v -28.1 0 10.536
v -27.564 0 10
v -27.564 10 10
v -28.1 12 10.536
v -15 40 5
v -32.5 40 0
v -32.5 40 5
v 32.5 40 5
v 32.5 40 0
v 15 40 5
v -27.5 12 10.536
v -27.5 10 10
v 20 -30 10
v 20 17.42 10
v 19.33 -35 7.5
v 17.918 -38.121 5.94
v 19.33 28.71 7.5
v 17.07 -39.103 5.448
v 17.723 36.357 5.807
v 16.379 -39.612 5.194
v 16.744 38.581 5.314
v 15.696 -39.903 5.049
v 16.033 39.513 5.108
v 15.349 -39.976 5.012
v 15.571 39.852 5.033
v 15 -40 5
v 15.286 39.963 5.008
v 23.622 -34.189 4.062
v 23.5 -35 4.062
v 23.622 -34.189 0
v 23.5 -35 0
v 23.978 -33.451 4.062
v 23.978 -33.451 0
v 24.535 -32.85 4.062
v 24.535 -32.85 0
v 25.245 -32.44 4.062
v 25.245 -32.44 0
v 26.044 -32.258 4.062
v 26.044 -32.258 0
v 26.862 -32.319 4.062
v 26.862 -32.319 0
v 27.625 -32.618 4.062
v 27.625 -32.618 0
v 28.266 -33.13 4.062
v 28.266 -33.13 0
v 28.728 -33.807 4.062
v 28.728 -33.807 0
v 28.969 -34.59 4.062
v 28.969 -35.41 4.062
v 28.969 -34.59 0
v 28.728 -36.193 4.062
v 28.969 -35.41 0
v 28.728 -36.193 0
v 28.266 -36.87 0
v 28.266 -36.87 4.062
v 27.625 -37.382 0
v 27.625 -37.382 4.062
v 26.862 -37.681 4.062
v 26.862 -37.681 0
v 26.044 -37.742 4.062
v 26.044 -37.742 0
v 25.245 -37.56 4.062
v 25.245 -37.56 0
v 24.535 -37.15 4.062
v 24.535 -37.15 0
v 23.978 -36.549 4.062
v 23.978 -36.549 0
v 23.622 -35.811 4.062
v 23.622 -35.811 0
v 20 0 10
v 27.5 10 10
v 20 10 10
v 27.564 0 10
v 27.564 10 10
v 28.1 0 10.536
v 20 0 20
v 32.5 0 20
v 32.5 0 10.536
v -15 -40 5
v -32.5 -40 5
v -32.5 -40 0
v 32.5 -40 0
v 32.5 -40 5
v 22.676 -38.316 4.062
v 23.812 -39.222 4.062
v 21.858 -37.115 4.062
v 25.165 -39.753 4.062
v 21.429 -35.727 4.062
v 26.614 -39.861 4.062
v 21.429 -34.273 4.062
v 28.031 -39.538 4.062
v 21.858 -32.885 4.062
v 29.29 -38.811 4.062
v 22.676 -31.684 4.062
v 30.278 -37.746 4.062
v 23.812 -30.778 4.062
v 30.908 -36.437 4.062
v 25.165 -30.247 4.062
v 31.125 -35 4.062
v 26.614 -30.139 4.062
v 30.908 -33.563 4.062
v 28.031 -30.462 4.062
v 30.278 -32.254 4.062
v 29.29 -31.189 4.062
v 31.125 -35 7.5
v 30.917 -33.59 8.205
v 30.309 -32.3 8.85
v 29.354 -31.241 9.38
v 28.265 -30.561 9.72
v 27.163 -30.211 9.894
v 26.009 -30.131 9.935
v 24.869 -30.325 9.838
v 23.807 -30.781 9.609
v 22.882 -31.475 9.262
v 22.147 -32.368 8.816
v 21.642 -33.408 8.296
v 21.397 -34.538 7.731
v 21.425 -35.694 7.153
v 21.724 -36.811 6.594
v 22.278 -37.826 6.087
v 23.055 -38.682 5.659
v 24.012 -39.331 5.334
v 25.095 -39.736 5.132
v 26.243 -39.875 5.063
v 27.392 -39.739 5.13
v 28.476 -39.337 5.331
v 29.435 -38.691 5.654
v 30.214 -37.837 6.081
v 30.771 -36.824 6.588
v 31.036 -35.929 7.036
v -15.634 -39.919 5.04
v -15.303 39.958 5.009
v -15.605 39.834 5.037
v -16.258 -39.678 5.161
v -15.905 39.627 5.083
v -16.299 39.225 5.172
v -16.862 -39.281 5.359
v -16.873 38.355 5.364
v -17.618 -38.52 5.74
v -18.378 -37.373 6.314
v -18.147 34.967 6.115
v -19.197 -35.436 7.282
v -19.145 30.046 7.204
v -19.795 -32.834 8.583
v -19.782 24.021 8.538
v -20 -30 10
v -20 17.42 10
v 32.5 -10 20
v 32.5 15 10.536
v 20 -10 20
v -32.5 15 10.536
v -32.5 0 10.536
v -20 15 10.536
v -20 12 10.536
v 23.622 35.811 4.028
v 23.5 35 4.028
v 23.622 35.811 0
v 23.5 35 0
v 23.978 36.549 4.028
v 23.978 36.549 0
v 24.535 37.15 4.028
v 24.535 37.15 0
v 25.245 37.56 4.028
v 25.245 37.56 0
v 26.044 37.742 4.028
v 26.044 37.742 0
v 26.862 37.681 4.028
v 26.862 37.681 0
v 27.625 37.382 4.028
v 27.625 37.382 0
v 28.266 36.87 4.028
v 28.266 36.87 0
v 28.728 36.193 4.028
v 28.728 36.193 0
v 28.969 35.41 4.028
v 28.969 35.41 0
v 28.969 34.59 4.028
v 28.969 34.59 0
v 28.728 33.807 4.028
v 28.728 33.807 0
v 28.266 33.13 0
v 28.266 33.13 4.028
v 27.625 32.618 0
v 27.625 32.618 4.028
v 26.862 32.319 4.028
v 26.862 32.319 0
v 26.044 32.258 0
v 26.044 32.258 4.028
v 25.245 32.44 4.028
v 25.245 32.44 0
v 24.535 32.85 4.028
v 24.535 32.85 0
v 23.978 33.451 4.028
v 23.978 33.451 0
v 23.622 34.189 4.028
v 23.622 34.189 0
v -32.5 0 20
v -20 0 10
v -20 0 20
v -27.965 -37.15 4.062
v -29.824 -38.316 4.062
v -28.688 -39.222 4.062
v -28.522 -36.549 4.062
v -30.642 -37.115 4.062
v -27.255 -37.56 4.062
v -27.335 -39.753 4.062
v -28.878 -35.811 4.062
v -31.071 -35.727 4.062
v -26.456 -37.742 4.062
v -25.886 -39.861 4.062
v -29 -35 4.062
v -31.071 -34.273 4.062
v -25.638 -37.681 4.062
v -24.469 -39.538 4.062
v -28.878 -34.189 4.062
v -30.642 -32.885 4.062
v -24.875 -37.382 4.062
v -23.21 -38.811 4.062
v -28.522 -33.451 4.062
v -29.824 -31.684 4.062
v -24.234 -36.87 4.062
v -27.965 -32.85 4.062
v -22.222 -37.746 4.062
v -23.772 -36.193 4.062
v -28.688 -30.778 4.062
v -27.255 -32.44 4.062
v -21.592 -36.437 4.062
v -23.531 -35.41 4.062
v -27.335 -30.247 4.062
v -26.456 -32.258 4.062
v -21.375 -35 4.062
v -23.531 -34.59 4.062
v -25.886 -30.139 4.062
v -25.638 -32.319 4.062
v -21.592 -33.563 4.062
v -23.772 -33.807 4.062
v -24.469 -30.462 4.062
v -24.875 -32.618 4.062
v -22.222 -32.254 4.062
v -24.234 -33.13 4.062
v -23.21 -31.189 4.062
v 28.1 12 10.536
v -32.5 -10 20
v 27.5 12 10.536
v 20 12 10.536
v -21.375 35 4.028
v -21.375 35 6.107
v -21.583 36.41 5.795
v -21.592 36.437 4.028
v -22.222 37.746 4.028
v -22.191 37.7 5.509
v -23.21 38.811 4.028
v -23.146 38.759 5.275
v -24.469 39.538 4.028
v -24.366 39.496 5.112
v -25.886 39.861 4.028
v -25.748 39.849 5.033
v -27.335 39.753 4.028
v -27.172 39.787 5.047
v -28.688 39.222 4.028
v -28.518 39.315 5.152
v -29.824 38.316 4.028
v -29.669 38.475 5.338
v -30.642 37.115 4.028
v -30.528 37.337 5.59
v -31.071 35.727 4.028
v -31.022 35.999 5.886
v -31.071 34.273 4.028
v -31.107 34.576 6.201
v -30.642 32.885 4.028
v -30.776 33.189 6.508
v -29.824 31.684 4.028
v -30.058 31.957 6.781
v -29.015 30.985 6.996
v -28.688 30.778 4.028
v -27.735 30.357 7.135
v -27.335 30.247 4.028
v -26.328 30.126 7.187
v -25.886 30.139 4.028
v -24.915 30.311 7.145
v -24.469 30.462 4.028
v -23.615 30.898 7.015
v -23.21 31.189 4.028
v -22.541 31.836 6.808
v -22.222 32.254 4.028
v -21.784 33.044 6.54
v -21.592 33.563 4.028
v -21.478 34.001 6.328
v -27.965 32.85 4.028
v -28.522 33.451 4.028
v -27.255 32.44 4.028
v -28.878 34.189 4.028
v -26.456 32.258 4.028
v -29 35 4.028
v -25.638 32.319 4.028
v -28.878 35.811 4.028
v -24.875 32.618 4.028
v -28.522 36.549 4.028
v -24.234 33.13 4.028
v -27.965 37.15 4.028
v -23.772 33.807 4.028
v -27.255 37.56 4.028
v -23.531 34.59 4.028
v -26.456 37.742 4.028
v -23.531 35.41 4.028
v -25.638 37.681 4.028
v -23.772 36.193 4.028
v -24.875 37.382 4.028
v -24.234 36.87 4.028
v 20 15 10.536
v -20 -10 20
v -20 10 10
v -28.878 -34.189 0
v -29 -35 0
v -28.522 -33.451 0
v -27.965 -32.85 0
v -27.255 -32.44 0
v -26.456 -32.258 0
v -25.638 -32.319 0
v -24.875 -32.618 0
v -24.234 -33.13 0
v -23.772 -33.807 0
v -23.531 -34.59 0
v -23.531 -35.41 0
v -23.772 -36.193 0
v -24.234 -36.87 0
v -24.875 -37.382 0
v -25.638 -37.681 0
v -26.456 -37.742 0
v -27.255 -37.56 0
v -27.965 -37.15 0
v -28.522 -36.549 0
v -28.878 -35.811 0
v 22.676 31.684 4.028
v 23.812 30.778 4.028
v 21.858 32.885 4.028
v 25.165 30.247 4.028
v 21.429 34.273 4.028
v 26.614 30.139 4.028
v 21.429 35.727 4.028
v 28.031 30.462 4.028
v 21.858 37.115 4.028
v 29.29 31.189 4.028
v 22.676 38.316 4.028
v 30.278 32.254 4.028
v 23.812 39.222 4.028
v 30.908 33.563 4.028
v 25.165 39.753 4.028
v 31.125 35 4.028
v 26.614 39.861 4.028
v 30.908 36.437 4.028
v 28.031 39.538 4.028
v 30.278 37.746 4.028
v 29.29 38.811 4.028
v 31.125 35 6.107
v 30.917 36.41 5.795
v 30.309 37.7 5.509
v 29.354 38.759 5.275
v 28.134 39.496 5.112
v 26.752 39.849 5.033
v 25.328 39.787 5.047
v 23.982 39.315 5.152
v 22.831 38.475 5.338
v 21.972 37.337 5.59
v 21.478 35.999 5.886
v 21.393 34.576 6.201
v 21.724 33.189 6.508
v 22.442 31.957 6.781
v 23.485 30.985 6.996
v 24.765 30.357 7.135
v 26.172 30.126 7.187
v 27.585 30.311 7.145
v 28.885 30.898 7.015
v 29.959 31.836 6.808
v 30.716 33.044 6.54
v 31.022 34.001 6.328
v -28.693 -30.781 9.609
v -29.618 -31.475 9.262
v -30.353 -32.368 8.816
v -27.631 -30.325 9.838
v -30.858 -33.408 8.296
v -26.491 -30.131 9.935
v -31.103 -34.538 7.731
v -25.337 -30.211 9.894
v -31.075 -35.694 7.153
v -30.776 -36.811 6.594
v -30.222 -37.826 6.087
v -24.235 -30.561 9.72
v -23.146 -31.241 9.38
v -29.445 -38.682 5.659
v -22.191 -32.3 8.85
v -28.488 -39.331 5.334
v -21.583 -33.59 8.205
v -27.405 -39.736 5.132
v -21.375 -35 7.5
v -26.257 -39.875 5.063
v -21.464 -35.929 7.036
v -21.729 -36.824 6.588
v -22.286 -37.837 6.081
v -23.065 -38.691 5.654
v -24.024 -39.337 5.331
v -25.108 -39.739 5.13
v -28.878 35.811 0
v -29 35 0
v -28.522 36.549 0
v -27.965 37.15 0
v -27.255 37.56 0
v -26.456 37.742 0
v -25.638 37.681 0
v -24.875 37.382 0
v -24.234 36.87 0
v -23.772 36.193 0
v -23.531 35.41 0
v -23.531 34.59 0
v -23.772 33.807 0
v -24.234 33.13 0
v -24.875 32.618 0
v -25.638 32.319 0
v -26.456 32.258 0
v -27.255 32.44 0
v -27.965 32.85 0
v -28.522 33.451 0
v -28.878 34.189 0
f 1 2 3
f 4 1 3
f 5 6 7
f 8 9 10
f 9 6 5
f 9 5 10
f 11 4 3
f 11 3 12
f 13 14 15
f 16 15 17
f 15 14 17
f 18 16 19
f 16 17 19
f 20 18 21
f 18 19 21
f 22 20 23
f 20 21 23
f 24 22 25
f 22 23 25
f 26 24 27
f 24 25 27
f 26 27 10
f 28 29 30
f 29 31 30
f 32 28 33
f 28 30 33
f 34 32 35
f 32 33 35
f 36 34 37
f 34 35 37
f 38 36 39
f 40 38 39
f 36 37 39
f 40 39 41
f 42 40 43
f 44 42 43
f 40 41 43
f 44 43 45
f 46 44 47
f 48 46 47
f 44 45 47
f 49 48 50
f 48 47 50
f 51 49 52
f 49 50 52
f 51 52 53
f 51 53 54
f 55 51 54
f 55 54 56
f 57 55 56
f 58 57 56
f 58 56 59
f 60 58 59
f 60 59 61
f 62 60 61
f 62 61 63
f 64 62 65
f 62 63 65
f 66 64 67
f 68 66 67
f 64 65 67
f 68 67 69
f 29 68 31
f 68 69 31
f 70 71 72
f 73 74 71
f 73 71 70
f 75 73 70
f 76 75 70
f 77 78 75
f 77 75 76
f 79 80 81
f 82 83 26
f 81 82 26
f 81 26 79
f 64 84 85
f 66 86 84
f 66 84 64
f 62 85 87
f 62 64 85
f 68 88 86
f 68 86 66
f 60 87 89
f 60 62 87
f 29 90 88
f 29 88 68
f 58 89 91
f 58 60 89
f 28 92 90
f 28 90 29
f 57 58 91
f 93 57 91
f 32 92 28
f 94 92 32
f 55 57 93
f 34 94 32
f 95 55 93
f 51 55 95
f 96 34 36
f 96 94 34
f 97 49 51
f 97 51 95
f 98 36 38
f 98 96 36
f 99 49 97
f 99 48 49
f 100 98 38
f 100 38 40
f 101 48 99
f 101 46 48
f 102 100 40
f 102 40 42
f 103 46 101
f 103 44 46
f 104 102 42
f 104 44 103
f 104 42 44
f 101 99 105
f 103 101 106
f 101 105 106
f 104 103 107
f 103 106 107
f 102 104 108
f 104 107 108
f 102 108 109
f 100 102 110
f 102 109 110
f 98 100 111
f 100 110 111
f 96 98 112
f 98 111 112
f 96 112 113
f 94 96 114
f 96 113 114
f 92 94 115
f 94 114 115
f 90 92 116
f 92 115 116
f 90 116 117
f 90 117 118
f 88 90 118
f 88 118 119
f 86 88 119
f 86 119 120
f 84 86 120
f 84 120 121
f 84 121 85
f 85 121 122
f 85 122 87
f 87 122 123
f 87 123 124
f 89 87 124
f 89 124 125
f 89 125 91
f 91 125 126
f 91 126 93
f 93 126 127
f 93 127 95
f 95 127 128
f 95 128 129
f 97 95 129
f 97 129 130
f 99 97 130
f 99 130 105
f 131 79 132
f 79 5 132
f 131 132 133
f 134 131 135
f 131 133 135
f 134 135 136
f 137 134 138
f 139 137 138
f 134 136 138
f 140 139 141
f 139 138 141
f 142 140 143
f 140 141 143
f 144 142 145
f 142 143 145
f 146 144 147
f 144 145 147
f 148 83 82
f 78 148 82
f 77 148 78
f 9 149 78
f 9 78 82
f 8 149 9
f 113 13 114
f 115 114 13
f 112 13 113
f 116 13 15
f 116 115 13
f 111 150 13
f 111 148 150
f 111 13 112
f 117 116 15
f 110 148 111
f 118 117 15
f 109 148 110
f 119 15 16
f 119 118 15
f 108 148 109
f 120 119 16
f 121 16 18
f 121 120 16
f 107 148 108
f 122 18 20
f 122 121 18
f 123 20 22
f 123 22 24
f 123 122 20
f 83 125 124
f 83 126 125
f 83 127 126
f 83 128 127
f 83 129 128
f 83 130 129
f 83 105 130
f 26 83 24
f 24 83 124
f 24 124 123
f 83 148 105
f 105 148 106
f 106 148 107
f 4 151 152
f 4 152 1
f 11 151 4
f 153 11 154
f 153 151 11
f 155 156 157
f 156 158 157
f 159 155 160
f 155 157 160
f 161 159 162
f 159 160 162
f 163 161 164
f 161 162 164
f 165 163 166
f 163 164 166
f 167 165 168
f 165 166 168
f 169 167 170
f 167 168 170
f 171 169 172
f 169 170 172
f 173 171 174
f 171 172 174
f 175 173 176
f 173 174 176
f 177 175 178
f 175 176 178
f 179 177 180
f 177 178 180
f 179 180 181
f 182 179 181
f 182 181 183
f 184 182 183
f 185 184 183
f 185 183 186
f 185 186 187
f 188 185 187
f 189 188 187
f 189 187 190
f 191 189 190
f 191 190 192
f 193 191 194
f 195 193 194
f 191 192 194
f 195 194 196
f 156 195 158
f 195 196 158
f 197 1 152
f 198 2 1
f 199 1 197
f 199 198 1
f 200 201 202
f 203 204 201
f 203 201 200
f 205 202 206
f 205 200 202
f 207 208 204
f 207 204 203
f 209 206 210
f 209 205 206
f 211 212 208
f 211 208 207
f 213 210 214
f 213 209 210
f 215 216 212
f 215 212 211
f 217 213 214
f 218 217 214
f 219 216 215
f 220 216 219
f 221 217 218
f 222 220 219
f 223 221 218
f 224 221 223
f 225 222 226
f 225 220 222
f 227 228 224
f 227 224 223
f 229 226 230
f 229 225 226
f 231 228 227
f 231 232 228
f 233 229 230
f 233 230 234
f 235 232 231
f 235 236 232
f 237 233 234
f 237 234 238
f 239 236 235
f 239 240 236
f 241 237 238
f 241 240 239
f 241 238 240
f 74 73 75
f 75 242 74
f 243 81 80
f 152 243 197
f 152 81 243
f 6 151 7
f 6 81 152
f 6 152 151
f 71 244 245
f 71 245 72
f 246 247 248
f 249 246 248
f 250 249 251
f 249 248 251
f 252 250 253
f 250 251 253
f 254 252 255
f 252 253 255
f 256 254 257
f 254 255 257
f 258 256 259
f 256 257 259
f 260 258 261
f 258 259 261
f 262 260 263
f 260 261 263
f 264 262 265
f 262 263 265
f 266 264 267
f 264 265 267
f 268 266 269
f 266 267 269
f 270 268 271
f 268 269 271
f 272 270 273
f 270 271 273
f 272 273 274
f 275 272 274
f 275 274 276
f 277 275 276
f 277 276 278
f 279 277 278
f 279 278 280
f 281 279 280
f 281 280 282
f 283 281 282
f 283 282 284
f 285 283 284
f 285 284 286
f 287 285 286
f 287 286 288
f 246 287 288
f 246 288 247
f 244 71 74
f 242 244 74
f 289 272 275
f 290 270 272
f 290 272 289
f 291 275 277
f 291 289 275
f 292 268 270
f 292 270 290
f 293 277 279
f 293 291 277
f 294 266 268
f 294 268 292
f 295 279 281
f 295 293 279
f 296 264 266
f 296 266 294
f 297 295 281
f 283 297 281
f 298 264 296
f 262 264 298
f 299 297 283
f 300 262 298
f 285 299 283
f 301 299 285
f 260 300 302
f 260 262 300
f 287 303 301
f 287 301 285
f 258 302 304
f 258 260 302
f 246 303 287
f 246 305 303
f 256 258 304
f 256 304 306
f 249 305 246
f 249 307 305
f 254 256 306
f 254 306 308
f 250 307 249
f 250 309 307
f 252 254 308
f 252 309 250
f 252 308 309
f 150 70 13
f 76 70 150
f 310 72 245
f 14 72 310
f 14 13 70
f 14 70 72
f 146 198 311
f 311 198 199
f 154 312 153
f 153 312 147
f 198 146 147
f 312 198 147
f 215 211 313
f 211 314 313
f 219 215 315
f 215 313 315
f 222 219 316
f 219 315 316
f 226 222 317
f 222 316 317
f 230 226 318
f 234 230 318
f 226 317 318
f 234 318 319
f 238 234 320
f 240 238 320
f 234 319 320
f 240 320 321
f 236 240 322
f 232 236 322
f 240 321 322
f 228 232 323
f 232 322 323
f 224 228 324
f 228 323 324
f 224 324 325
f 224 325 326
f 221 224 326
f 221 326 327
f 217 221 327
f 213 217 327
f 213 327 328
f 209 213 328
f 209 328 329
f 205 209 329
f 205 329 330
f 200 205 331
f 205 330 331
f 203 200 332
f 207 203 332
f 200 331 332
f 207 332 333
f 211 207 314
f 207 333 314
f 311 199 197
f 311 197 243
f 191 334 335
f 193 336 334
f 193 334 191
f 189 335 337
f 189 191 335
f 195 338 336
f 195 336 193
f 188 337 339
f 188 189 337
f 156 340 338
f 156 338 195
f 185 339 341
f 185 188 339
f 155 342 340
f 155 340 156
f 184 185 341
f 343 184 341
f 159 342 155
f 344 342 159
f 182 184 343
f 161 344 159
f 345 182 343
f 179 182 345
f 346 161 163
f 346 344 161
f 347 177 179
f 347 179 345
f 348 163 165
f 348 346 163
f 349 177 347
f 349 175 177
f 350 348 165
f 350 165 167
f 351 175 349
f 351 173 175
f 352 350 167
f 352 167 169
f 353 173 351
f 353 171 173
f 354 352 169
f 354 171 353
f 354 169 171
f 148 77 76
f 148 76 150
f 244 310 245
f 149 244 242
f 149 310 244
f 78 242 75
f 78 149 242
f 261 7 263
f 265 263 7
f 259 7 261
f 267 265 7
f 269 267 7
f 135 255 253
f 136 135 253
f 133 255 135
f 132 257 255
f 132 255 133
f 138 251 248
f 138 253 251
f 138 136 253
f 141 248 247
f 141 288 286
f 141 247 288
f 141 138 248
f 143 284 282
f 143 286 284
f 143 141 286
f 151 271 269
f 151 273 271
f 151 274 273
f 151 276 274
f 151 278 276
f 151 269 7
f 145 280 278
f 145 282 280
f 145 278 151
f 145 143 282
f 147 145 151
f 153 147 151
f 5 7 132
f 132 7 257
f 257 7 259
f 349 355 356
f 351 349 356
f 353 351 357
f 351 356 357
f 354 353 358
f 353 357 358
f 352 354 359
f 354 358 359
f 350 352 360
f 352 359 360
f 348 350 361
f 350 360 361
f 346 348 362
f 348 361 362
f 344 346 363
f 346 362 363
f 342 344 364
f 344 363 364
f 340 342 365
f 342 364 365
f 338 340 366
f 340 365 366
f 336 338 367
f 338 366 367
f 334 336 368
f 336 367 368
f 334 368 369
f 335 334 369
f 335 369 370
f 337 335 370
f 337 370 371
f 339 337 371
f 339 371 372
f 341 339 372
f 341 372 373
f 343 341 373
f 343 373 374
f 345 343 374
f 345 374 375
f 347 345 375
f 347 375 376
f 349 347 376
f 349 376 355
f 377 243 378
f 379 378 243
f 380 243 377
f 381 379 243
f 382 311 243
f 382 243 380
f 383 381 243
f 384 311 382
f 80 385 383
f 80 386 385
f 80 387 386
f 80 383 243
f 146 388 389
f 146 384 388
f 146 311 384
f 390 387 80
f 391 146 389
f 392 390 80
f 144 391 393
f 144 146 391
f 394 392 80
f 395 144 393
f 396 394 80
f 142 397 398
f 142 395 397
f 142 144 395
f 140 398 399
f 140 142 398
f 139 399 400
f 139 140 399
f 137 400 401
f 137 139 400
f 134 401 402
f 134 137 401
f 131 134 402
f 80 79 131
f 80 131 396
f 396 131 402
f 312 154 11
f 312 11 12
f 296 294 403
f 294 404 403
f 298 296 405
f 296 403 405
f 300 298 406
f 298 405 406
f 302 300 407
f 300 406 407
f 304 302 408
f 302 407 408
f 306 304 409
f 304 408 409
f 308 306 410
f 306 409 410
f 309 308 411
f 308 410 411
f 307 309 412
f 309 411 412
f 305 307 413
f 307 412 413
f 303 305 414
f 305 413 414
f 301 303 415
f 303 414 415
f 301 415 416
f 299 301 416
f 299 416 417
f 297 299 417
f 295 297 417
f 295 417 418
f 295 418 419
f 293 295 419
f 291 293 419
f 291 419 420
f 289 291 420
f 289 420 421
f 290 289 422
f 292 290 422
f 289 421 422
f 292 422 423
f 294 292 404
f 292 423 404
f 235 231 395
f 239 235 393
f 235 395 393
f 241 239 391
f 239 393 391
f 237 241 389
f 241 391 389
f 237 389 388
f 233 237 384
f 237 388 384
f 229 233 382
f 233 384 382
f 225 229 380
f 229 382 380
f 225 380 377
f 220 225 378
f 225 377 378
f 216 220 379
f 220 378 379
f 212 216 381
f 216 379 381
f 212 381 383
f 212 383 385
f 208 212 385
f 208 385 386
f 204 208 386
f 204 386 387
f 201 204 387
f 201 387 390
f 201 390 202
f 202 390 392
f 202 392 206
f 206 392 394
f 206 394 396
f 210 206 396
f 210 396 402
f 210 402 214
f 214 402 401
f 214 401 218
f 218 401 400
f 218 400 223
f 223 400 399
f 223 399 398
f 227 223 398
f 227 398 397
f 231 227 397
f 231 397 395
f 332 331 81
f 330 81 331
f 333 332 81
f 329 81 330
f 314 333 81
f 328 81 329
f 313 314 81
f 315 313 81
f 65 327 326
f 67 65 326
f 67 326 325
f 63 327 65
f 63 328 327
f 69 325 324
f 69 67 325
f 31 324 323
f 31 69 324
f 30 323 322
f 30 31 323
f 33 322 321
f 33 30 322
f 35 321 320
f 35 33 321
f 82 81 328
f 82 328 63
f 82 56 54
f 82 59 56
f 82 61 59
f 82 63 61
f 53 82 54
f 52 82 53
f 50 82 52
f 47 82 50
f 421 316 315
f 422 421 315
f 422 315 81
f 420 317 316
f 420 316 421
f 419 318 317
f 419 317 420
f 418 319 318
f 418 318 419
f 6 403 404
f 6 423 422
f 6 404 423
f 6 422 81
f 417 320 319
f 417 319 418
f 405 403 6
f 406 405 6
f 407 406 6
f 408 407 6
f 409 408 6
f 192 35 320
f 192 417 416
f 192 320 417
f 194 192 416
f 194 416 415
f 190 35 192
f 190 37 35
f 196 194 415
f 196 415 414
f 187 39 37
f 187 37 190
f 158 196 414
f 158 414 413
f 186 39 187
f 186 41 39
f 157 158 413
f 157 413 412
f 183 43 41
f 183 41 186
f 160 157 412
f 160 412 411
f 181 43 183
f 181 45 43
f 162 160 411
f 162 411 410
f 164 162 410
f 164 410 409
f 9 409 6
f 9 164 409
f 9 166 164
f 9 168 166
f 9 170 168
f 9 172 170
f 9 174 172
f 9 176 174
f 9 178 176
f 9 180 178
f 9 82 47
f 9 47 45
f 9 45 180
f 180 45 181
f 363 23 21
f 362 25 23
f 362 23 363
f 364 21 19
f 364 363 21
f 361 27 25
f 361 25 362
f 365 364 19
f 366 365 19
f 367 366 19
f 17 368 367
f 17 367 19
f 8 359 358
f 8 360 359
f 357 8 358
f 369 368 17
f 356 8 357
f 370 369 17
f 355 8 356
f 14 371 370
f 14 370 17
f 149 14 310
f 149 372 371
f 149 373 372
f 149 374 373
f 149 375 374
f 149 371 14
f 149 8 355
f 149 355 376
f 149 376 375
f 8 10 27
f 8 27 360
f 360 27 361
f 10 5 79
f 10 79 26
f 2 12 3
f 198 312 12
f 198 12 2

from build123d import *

# Parameters (mm, degrees)
F1_DEPTH       = 32.5
F2_W           = 40
F2_H           = 15
F3_DEPTH       = 40.001
F3_DEPTH_BACK  = 40.001
F4_R           = 4.99999
F6_D           = 5.5
F6_START       = 4.9375
F6_START_2     = 4.9723205
F6_CBORE_D     = 9.75
F6_CBORE_DEPTH = 1
F7_W           = 5
F7_H           = 12
F8_DEPTH       = 0.5358983849
F9_T4_DEPTH    = 13.5430097928
F9_T10_DEPTH   = 13.5430097928


# Not quite as in the source:
# - a fillet or chamfer that OpenCascade refuses, or shapes differently, is made with other operations: its cross-section is extruded or revolved along the edge and cut away or added
# - a fillet or chamfer is up to 0.001 mm smaller than in the source, because OpenCascade refuses the exact size


with BuildPart() as f1:
    # F0 (on Right) → F1 (new body, symmetric)
    with BuildSketch(Plane.YZ):
        Polygon((0, 10), (0, 20), (-10, 20), (-40, 5), (-40, 0), (40, 0), (40, 5), (15, 10.5358983849), (12, 10.5358983849), (10, 10), align=None)
    extrude(amount=F1_DEPTH, both=True)

    # F2 (on Front) → F3 (cut, two sides)
    with BuildSketch(Plane.XZ) as f3_sk:
        with Locations((0, 12.5)):
            Rectangle(F2_W, F2_H)
    extrude(amount=-F3_DEPTH, mode=Mode.SUBTRACT)
    extrude(f3_sk.sketch, amount=F3_DEPTH_BACK, mode=Mode.SUBTRACT)

    # F4 (radius 5 in the source; OpenCascade refuses exactly that, so slightly less here)
    f4_edges = [f1.edges().sort_by_distance(p)[0] for p in [
        (20, 0, 5),
        (-20, 0, 5),
    ]]
    fillet(f4_edges, radius=F4_R)

    # F6 (through all)
    # its depths count from where the whole tool has entered the part; down to there all is cleared
    with Locations(Plane.XY.offset(10)):
        with Locations((-26.25, 35, -F6_START_2), (26.25, 35, -F6_START_2), (-26.25, -35, -F6_START), (26.25, -35, -F6_START)):
            CounterBoreHole(F6_D / 2, F6_CBORE_D / 2, F6_CBORE_DEPTH)

    # F7 (on face) → F8 (join, through all)
    with BuildSketch(Plane.XY.offset(10)):
        with Locations((-30, 6)):
            Rectangle(F7_W, F7_H)
        with Locations((30, 6)):
            Rectangle(F7_W, F7_H)
    extrude(amount=F8_DEPTH)

    # F9: chamfer of 0.6 on 2 edges, made by hand


with BuildPart() as f9_tool2:
    # F9_s3 → F9_t4 (new body)
    with BuildSketch(Plane.XZ.offset(-13.5430097928)):
        Polygon((27.5, 9.9358983849), (28.1, 10.5358983849), (27.5, 10.5358983849), align=None)
    extrude(amount=F9_T4_DEPTH)

    split(bisect_by=Plane(origin=(0, -1.8301270189, 6.8301270189), x_dir=(1, 0, 0), z_dir=(0, -0.2588190451, 0.9659258263)), keep=Keep.TOP)

    split(bisect_by=Plane.XY.offset(10), keep=Keep.TOP)


with BuildPart() as f1_1:
    add(f1.part)

    # F9_t1: cut F9_tool2
    add(f9_tool2.part, mode=Mode.SUBTRACT)


with BuildPart() as f9_tool8:
    # F9_s9 → F9_t10 (new body)
    with BuildSketch(Plane.XZ):
        Polygon((-27.5, 9.9358983849), (-28.1, 10.5358983849), (-27.5, 10.5358983849), align=None)
    extrude(amount=-F9_T10_DEPTH)

    split(bisect_by=Plane(origin=(0, -1.8301270189, 6.8301270189), x_dir=(1, 0, 0), z_dir=(0, -0.2588190451, 0.9659258263)), keep=Keep.TOP)

    split(bisect_by=Plane.XY.offset(10), keep=Keep.TOP)


with BuildPart() as f1_2:
    add(f1_1.part)

    # F9_t7: cut F9_tool8
    add(f9_tool8.part, mode=Mode.SUBTRACT)


solid = f1_2.part
